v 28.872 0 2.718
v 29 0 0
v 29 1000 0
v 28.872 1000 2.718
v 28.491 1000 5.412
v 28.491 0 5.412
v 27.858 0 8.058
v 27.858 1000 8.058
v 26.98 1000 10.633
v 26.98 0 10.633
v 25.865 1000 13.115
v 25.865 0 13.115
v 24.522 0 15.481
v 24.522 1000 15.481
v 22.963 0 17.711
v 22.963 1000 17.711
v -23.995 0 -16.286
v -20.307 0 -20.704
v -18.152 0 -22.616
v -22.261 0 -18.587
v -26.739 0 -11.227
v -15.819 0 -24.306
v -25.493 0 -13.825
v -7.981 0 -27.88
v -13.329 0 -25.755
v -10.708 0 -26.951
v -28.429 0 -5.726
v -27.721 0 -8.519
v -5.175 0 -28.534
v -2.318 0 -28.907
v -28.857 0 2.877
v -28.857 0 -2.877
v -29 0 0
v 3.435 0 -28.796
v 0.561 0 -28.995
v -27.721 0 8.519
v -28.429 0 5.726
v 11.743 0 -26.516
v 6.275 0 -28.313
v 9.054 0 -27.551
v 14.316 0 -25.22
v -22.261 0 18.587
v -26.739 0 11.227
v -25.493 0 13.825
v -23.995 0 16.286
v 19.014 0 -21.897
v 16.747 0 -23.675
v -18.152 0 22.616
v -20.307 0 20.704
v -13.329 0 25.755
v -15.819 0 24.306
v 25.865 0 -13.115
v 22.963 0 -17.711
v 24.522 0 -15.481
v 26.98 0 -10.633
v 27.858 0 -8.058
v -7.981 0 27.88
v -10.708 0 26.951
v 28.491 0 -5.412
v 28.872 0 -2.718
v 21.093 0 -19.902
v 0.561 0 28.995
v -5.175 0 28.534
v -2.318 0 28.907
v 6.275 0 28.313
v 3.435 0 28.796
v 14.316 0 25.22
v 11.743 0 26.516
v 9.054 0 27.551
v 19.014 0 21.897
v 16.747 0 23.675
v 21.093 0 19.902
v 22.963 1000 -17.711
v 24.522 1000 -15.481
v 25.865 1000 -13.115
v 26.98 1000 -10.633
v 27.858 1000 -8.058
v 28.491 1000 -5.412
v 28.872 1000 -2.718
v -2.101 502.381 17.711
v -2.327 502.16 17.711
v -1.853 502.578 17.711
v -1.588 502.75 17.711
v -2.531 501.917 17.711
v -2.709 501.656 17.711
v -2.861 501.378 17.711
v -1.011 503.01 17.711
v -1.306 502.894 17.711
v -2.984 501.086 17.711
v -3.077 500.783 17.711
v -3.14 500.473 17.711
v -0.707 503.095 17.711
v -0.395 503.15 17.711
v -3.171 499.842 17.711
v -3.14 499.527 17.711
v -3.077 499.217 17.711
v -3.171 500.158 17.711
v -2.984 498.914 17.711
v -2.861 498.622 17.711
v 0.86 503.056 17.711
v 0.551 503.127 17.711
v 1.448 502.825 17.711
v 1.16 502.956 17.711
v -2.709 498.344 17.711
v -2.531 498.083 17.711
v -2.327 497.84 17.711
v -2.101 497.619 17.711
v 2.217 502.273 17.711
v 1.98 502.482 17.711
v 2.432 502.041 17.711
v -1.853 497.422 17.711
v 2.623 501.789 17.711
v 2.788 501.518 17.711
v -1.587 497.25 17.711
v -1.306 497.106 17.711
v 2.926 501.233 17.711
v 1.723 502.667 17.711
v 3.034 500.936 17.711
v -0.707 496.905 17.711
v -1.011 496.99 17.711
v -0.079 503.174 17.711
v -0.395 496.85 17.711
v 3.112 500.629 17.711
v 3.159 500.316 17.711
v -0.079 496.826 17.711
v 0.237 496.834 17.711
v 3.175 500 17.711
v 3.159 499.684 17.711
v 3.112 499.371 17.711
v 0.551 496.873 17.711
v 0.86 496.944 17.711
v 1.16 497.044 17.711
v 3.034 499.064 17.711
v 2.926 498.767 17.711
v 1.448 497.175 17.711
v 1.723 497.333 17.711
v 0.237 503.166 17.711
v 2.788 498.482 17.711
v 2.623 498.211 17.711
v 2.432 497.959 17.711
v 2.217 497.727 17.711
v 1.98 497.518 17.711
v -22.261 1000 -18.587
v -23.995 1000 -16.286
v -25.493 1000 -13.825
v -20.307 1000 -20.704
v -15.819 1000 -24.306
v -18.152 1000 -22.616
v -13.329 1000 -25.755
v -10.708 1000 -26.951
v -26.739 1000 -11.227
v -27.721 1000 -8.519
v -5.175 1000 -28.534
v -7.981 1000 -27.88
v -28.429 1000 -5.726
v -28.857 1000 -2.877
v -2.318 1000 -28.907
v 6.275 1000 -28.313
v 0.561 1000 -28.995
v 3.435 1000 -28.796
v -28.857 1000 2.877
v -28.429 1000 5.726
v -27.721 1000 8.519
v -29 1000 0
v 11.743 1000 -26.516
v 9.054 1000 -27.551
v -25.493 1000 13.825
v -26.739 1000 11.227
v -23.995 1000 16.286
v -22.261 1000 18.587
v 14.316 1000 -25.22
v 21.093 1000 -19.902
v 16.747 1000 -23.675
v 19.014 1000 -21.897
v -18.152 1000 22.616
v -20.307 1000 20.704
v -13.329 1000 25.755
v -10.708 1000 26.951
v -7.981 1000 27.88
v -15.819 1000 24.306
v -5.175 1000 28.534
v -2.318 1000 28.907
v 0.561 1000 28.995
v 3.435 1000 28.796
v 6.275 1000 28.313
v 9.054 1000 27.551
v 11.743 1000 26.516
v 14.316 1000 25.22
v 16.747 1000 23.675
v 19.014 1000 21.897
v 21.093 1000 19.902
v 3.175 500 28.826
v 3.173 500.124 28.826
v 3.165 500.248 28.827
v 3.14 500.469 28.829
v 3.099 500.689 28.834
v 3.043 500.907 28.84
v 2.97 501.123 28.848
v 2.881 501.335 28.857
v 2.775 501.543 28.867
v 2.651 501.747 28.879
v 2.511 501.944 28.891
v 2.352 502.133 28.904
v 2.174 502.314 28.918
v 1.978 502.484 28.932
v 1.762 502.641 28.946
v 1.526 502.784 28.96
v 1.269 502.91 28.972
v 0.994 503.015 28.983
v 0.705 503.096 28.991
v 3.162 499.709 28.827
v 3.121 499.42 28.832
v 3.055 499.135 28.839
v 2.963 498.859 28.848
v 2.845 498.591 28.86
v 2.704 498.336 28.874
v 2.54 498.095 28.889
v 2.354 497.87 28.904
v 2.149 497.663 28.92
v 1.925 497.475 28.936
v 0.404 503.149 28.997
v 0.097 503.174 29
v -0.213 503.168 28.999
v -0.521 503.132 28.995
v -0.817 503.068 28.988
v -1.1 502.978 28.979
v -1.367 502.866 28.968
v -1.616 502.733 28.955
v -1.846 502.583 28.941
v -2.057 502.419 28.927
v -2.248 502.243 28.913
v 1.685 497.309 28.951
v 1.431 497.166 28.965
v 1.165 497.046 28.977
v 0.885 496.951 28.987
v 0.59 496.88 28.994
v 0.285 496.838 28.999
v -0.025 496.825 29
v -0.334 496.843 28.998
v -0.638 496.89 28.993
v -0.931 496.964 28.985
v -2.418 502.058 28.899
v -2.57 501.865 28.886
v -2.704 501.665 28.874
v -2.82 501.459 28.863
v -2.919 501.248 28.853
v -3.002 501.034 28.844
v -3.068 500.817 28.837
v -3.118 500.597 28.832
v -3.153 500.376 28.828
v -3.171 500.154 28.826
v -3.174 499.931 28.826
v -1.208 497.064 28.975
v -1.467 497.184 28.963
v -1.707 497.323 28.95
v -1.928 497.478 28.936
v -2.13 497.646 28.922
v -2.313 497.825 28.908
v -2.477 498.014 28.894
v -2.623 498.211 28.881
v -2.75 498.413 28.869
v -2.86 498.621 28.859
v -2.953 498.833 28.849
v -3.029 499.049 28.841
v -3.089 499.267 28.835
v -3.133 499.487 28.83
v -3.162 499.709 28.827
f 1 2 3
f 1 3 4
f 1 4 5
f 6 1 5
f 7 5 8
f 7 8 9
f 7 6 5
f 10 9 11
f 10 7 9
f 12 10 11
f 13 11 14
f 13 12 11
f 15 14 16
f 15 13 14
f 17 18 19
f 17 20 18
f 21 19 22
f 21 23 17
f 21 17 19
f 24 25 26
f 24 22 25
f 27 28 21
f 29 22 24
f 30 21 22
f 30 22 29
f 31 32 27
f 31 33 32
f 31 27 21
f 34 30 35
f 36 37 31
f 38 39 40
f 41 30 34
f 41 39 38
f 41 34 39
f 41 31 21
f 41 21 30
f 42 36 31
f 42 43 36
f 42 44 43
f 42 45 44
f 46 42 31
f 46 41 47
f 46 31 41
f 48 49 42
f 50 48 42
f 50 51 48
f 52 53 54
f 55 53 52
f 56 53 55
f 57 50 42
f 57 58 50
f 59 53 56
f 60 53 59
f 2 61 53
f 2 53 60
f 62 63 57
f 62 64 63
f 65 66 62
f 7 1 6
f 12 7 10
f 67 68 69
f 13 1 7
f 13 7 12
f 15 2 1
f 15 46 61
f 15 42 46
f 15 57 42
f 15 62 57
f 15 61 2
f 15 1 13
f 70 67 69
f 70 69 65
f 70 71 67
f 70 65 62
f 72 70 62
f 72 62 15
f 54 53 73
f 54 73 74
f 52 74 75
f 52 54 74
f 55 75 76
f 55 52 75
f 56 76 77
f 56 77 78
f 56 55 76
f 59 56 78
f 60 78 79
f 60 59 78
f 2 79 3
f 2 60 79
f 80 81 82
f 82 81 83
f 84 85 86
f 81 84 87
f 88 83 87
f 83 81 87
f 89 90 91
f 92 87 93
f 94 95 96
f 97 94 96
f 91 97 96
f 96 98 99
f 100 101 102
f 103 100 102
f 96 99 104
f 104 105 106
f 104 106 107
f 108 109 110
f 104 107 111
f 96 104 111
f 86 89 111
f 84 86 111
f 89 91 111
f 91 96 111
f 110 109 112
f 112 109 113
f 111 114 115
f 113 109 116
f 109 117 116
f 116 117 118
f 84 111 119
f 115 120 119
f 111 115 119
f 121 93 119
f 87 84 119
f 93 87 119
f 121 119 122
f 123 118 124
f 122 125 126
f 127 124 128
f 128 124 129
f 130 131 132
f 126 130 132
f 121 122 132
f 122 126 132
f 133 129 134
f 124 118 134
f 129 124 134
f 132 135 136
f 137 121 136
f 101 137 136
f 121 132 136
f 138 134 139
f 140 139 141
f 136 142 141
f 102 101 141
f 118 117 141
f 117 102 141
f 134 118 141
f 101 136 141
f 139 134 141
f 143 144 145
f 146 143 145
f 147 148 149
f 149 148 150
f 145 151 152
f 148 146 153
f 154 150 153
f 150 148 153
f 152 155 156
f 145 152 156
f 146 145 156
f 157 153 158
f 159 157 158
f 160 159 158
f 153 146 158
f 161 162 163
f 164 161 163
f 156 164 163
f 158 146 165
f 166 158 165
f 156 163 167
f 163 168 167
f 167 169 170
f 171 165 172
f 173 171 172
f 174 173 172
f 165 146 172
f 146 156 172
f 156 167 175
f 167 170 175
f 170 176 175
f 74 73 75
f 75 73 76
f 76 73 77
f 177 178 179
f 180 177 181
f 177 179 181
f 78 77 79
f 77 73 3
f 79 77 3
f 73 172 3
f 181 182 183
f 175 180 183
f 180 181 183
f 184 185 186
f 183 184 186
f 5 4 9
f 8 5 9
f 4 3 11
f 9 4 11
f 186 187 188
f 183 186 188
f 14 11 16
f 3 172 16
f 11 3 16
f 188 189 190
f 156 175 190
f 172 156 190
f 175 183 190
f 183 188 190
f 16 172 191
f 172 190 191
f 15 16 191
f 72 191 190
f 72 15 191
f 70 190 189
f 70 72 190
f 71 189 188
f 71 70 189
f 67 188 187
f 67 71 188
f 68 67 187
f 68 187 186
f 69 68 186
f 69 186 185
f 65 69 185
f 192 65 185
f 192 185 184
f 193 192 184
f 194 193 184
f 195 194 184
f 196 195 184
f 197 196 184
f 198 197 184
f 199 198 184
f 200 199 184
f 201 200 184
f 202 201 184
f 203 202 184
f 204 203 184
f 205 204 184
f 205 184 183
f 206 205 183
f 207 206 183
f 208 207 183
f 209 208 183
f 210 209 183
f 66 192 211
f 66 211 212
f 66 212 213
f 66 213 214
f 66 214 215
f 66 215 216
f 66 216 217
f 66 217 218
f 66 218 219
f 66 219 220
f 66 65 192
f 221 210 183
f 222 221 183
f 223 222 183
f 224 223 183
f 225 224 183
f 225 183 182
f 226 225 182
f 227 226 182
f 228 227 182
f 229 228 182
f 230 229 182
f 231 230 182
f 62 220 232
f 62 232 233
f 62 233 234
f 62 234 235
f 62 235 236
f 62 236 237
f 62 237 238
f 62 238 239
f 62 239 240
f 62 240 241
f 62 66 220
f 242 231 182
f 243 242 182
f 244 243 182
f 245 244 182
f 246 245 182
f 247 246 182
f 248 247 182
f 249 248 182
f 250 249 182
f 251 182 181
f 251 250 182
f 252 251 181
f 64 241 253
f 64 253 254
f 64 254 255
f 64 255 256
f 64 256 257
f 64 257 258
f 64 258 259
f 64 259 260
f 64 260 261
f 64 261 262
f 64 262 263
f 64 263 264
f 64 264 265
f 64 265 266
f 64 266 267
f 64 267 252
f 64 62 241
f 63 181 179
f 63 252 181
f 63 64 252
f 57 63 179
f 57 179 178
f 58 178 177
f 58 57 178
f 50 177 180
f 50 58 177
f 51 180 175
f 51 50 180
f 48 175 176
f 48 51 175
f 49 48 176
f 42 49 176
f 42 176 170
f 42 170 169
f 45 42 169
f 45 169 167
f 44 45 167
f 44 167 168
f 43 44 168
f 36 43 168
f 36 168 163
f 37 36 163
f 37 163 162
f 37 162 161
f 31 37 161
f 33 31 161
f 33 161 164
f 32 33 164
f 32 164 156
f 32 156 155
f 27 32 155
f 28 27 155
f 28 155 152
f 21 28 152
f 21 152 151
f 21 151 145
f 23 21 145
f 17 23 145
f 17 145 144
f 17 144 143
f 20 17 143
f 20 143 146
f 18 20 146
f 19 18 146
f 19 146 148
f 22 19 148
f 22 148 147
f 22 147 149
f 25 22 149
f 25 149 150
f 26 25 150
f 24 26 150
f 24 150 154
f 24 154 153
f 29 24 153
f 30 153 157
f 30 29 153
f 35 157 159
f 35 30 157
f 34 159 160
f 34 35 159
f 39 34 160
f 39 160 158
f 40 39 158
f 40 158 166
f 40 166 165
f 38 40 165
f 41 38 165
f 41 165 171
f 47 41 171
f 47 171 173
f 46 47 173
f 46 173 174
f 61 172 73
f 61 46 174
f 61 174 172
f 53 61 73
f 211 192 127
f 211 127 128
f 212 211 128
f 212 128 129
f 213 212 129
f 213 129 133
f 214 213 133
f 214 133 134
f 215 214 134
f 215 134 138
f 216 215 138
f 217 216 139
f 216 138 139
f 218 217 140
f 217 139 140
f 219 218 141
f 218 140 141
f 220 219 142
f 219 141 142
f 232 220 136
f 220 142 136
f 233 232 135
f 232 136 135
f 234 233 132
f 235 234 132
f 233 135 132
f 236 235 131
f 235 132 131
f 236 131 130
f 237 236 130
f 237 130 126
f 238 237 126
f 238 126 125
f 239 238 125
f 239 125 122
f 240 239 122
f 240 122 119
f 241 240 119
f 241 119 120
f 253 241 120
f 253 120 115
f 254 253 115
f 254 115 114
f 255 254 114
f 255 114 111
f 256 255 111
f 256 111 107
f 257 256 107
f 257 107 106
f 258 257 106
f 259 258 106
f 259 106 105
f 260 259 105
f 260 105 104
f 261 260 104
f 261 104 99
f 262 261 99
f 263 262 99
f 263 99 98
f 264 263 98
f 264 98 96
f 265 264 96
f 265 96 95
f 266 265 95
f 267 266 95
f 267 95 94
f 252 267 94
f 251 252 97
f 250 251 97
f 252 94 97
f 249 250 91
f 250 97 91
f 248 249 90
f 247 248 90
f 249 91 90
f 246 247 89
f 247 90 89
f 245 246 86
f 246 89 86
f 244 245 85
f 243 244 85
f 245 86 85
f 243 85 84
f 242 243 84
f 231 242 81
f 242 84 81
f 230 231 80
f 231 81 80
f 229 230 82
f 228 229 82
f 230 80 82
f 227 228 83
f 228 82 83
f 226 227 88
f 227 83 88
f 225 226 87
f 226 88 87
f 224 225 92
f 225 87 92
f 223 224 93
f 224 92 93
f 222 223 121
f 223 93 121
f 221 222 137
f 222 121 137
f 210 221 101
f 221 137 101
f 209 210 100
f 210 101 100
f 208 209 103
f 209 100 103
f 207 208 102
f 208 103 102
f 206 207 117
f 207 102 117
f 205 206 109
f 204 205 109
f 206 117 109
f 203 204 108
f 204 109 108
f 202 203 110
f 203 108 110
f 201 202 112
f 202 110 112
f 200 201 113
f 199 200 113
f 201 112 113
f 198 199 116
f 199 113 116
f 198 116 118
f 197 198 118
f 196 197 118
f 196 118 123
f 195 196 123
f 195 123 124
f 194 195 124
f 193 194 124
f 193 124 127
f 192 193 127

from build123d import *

# Parameters (mm, degrees)
F0_W     = 45.9264908458
F0_H     = 35.4225555062
F2_DEPTH = 1000
F4_DEPTH = 1000
F5_D     = 6.35
F5_DEPTH = 11.2897222469


with BuildPart() as f2:
    # F0 (on Front) → F2 (new body)
    with BuildSketch(Plane.XZ):
        Rectangle(F0_W, F0_H)
    extrude(amount=-F2_DEPTH)

    # F0 (on Front) → F4 (join)
    with BuildSketch(Plane.XZ):
        with BuildLine():
            ThreePointArc((22.9632454229, -17.7112777531), (27.4493544302, -9.3559040914), (29, 0))
            ThreePointArc((29, 0), (27.4493544302, 9.3559040914), (22.9632454229, 17.7112777531))
            Line((22.9632454229, 17.7112777531), (22.9632454229, -17.7112777531))
        make_face()
        with BuildLine():
            Line((-22.9632454229, 17.7112777531), (22.9632454229, 17.7112777531))
            ThreePointArc((22.9632454229, 17.7112777531), (0, 29), (-22.9632454229, 17.7112777531))
        make_face()
        Rectangle(F0_W, F0_H)
        with BuildLine():
            ThreePointArc((-22.9632454229, -17.7112777531), (0, -29), (22.9632454229, -17.7112777531))
            Line((22.9632454229, -17.7112777531), (-22.9632454229, -17.7112777531))
        make_face()
        with BuildLine():
            Line((-22.9632454229, -17.7112777531), (-22.9632454229, 17.7112777531))
            ThreePointArc((-22.9632454229, 17.7112777531), (-29, 0), (-22.9632454229, -17.7112777531))
        make_face()
    extrude(amount=-F4_DEPTH)

    # F5 (through all, one way)
    with BuildSketch(Plane(origin=(0, 0, 17.7112777531), x_dir=(1, 0, 0), z_dir=(0, 0, -1))):
        with Locations((0, -500)):
            Circle(F5_D / 2)
    extrude(amount=-F5_DEPTH, mode=Mode.SUBTRACT)


solid = f2.part
